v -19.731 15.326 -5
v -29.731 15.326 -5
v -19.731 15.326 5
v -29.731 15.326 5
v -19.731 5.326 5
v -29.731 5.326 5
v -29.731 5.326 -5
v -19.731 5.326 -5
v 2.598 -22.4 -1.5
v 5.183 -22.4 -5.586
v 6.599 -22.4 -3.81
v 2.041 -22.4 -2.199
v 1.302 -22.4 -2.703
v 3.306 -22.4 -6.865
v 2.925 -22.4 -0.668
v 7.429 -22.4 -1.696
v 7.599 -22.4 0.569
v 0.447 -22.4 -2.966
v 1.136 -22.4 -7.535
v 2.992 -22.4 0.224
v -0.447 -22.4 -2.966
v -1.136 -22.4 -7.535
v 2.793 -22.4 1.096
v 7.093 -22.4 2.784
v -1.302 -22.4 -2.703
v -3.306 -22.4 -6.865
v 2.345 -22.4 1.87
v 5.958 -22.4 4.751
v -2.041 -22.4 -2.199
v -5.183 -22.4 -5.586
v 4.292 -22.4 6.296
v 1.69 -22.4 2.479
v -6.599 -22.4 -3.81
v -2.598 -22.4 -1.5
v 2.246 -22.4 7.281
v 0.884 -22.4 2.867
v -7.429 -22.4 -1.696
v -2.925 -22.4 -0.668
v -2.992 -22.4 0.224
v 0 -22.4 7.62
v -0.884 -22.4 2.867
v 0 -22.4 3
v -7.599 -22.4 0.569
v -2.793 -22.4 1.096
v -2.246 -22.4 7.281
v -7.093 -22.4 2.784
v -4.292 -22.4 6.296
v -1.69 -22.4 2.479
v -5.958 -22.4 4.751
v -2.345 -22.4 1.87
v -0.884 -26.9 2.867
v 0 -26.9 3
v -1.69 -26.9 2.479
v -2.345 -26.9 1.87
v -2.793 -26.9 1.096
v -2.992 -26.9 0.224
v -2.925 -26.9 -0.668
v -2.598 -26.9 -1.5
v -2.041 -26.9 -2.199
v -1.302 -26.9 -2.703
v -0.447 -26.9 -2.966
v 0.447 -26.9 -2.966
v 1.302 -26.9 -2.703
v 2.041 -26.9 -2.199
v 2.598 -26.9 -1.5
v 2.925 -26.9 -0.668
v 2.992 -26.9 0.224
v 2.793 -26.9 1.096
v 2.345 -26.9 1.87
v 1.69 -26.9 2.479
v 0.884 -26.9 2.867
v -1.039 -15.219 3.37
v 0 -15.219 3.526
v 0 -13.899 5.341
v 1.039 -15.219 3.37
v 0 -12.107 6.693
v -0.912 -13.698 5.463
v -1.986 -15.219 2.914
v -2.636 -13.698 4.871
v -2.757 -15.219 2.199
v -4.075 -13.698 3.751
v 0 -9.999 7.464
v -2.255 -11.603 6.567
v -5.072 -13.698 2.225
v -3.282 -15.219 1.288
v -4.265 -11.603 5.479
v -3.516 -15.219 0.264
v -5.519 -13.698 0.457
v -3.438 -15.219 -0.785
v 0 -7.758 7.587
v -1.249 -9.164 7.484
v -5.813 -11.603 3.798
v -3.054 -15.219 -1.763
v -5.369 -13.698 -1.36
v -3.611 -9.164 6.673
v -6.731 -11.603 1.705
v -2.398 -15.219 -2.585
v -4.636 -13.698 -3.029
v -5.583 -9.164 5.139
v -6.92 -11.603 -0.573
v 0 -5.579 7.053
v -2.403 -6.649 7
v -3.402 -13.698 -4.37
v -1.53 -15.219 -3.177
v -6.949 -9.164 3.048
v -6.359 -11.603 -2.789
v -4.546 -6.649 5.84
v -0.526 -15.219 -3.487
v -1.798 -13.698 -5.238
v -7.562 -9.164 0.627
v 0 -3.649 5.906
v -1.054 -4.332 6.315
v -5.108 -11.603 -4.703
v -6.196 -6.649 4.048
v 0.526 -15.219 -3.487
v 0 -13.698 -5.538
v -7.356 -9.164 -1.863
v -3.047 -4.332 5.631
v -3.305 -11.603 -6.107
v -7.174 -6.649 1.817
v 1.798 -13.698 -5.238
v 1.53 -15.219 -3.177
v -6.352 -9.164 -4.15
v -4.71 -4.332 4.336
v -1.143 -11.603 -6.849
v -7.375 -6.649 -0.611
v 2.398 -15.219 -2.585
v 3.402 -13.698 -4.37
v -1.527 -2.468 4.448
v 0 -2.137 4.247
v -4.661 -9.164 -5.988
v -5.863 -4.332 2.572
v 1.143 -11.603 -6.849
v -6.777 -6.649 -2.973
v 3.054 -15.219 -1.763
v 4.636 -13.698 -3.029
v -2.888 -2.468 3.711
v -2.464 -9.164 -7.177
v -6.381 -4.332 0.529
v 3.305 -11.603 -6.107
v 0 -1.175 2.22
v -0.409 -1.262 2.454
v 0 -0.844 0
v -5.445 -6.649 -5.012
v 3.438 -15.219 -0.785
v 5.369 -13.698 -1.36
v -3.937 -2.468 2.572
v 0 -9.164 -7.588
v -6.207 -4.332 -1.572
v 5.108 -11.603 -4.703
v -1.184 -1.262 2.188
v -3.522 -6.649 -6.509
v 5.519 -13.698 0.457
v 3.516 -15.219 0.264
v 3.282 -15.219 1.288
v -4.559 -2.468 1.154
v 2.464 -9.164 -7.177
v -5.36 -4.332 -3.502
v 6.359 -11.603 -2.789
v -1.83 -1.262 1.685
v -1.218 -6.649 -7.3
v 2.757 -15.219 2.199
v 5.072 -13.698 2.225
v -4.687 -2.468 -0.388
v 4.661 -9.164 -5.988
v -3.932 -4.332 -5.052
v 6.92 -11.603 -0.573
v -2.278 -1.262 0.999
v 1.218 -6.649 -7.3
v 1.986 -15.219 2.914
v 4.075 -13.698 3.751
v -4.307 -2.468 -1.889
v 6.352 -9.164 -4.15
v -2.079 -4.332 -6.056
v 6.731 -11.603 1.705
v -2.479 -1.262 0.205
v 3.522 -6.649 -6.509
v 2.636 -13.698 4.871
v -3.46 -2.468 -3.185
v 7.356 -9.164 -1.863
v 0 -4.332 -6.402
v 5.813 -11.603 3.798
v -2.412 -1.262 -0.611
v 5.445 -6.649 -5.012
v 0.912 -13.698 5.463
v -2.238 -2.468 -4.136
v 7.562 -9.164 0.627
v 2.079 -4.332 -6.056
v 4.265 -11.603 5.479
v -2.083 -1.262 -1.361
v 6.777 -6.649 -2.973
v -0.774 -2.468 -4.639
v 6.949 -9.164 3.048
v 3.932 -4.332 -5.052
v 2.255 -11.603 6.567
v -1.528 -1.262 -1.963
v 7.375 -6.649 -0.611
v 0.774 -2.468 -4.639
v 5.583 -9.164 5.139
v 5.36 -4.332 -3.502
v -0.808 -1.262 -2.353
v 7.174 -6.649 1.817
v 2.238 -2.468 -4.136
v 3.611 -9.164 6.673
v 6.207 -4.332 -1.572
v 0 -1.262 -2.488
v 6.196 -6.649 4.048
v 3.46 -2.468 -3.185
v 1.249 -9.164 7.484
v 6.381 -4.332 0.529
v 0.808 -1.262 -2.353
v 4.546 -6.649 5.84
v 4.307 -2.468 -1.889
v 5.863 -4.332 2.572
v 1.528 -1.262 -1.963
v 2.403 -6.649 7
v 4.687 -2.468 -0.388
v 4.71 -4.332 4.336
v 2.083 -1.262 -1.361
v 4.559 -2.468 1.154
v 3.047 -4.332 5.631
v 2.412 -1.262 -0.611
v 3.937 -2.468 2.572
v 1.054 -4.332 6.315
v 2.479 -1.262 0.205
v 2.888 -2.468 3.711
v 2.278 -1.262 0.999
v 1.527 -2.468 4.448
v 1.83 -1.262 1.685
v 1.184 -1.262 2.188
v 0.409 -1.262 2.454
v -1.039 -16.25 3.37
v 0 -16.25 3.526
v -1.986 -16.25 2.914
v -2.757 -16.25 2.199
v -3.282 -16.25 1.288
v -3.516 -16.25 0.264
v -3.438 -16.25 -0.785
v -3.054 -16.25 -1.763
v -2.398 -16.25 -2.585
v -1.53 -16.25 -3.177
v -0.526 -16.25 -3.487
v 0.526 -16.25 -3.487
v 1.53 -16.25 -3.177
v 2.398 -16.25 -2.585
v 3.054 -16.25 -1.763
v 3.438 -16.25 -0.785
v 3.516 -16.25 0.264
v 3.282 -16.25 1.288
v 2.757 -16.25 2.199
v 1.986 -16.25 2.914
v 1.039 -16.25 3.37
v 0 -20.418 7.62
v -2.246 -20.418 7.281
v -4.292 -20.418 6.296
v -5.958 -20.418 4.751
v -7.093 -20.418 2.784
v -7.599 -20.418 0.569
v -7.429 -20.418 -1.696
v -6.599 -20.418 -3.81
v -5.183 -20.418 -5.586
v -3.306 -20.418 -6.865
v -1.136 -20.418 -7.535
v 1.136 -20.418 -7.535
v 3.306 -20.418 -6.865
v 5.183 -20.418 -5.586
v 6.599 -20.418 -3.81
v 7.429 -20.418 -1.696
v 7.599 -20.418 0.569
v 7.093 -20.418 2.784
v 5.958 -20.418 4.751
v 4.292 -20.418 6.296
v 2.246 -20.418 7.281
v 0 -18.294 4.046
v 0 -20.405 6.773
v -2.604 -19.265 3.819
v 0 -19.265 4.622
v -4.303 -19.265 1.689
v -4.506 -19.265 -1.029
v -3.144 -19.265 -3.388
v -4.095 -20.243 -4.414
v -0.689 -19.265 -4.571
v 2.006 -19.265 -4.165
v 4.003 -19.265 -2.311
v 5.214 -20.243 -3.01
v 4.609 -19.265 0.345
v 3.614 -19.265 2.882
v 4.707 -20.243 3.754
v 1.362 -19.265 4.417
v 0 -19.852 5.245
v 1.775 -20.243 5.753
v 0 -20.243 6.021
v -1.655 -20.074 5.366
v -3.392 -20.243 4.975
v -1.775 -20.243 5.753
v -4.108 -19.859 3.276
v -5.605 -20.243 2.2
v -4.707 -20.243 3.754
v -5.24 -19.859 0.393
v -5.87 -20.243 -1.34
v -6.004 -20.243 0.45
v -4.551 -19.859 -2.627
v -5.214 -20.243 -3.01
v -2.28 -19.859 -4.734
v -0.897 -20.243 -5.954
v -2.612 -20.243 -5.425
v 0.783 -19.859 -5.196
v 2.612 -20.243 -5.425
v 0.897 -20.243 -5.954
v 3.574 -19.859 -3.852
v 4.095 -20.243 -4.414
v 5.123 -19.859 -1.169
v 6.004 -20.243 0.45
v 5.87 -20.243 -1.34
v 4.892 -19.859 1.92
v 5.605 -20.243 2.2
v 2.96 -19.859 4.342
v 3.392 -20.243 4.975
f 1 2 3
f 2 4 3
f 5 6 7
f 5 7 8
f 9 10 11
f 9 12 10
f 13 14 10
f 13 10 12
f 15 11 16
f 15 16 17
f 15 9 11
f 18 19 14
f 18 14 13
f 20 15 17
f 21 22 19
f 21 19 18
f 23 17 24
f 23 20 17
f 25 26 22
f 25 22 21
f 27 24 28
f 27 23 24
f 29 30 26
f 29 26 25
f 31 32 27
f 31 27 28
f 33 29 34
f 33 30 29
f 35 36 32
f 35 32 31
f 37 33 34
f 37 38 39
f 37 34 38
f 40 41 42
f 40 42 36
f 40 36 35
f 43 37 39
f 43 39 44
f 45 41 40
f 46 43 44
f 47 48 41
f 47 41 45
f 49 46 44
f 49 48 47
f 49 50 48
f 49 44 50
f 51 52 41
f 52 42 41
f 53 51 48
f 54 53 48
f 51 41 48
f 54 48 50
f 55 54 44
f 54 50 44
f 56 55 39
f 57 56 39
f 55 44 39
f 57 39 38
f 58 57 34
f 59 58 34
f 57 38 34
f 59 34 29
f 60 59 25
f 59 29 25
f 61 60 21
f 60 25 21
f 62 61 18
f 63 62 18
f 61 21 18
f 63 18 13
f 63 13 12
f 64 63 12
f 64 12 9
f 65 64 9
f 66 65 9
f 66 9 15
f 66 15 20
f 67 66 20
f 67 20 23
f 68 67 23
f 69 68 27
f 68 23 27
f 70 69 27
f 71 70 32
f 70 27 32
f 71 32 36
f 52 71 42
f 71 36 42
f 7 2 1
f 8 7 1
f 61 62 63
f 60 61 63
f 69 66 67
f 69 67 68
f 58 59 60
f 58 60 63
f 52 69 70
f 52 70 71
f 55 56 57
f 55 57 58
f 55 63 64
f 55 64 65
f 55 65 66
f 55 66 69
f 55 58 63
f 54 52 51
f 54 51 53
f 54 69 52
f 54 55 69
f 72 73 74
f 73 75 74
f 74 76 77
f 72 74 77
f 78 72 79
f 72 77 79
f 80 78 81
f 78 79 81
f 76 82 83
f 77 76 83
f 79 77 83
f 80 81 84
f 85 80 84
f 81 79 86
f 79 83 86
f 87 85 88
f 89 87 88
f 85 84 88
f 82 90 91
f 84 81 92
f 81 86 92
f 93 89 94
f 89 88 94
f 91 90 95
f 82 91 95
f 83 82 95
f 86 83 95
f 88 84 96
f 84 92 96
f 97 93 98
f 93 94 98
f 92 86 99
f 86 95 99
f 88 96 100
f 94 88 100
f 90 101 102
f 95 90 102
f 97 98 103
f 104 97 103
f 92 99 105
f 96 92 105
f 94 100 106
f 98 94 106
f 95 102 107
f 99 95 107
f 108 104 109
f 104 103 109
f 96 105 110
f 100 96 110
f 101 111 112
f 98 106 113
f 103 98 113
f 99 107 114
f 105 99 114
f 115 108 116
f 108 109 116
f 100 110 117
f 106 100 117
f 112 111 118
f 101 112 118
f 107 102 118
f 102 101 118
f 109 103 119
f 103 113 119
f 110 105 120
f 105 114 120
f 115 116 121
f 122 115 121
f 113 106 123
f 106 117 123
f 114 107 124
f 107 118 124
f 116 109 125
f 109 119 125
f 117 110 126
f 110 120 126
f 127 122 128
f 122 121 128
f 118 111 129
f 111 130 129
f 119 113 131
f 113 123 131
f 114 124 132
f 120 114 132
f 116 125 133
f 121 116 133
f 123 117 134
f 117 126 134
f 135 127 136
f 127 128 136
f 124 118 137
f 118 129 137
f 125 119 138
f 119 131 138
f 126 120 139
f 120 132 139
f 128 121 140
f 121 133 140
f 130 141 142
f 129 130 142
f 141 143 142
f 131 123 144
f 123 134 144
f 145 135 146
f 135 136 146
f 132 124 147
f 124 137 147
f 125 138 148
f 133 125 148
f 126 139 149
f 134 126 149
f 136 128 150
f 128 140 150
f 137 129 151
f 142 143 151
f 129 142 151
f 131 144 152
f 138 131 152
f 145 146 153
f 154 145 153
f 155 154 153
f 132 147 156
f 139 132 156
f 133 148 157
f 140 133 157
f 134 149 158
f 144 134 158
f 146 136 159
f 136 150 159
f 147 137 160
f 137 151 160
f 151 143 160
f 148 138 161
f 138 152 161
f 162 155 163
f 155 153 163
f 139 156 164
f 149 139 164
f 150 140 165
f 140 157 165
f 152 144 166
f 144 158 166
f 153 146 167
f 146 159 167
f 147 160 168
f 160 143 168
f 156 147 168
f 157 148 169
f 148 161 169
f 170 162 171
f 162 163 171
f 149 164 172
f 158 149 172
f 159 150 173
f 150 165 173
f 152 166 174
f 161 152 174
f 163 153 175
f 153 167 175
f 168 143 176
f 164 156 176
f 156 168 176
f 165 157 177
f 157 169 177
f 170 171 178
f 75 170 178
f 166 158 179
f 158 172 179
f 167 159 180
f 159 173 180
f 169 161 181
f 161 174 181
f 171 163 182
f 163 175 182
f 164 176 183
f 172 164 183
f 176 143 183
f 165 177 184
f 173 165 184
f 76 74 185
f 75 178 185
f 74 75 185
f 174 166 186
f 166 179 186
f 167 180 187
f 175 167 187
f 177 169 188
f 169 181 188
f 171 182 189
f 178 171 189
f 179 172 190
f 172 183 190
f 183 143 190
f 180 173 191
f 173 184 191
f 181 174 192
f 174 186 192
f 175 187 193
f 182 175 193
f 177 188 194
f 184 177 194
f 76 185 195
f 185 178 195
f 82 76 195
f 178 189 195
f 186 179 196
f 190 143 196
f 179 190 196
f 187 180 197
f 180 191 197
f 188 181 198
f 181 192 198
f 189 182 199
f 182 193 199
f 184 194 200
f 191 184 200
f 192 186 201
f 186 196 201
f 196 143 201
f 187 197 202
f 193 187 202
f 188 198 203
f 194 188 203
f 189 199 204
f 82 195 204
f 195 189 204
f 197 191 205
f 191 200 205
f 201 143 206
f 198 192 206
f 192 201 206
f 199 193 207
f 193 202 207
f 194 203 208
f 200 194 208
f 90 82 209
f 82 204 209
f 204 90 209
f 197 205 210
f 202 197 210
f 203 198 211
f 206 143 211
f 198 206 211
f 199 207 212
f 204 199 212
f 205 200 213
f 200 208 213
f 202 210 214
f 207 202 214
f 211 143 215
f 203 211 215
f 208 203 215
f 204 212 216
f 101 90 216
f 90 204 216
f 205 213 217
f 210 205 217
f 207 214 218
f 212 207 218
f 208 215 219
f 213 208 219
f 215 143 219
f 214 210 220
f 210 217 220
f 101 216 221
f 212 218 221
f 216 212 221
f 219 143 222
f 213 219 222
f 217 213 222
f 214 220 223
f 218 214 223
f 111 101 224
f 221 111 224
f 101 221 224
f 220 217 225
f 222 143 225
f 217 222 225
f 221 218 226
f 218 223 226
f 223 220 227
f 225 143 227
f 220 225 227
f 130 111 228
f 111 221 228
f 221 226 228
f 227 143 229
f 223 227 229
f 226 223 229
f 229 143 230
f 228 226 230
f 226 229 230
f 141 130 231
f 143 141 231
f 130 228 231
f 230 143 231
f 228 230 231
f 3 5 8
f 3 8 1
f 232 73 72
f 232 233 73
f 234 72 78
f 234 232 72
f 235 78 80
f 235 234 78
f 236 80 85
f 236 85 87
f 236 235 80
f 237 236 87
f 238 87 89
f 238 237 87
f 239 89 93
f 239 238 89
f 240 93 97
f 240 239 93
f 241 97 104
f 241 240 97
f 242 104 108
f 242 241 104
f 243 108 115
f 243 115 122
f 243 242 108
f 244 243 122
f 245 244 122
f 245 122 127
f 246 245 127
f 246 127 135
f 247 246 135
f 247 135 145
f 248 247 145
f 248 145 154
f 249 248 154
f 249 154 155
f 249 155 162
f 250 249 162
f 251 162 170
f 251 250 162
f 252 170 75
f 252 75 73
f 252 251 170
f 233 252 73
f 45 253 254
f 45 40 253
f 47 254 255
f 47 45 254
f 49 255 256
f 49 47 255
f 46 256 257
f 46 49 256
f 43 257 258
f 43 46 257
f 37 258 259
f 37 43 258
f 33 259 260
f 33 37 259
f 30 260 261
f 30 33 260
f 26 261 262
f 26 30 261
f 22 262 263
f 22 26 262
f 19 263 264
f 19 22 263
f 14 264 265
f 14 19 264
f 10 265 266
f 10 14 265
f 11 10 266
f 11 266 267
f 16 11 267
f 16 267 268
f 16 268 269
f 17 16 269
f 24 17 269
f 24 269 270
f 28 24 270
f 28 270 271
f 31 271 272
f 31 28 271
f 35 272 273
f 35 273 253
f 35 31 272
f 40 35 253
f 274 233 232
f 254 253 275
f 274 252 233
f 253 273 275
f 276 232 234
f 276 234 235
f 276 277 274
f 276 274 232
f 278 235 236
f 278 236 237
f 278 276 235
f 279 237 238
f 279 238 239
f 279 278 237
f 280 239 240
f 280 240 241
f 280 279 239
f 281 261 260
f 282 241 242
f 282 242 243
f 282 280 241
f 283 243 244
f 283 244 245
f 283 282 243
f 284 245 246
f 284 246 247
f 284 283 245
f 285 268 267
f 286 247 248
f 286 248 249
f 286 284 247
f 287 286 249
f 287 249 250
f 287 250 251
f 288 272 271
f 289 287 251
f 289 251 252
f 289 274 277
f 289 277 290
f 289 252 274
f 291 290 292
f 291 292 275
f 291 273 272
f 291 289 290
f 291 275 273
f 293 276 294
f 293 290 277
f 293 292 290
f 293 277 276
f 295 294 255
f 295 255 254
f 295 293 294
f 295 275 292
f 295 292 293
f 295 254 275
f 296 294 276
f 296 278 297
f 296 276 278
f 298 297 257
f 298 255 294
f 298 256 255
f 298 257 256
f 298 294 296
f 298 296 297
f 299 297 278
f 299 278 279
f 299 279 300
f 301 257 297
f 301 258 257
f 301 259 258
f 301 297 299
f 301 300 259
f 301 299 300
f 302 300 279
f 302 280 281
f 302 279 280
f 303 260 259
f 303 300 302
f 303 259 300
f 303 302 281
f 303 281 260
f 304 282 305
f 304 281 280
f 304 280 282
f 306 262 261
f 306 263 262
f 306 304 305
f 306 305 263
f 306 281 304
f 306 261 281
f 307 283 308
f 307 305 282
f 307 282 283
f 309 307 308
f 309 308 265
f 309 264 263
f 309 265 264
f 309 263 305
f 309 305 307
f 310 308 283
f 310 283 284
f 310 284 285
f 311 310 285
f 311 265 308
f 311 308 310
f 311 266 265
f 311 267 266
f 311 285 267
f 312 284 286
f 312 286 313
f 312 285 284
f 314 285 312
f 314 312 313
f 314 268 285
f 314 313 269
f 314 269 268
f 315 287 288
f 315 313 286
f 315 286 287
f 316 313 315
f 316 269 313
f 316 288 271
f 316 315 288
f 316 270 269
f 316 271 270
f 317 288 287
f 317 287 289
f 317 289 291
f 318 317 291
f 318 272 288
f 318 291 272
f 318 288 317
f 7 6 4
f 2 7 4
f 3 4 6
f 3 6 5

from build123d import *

# Parameters (mm, degrees)
SKETCH1_W           = 10
SKETCH1_H           = 15
SCALE1_SCALE        = 0.3
SKETCH5_W           = 10
SKETCH5_H           = 10
BOSS_EXTRUDE1_DEPTH = 5


with BuildPart() as part:
    # Sketch1 → Revolve2 (revolve)
    with BuildSketch(Plane(origin=(0, 0, 0), x_dir=(0, 0, -1), z_dir=(1, 0, 0))):
        with BuildLine():
            Line((0, 25.4), (0, -25.4))
            ThreePointArc((0, -25.4), (-25.4, 0), (0, 25.4))
        make_face()
        with BuildLine():
            Line((0, -46.453146802), (0, -25.4))
            ThreePointArc((0, -25.4), (-6.051284035, -24.668643285), (-11.754091911, -22.516689884))
            Line((-11.754091911, -22.516689884), (-11.754091911, -25.953962773))
            add(Edge.make_bspline(
                [(-11.754091911, -25.953962773), (-13.625124372, -40.663791469), (-25.4, -39.846348213)],
                knots=[0, 0, 0, 1, 1, 1], degree=2))
            Line((-25.4, -39.846348213), (-25.4, -46.453146802))
            Line((-25.4, -46.453146802), (-10, -46.453146802))
            Line((-10, -46.453146802), (0, -46.453146802))
        make_face()
        with Locations((-5, -53.953146802)):
            Rectangle(SKETCH1_W, SKETCH1_H)
    revolve(axis=Axis((0, 38.955963628, 0), (0, -1, 0)))


with BuildPart() as part_1:
    # Scale1: scaled about (0, -12.091541088, 0)
    add(part.part.scale(SCALE1_SCALE).moved(Location((0, -8.464078762, 0))))


with BuildPart() as body_2:
    # Sketch5 → Boss-Extrude1 (new, symmetric)
    with BuildSketch(Plane.XY):
        with Locations((-24.731084823, 10.325763219)):
            Rectangle(SKETCH5_W, SKETCH5_H)
    extrude(amount=BOSS_EXTRUDE1_DEPTH, both=True)


solid = Compound([part_1.part, body_2.part])
